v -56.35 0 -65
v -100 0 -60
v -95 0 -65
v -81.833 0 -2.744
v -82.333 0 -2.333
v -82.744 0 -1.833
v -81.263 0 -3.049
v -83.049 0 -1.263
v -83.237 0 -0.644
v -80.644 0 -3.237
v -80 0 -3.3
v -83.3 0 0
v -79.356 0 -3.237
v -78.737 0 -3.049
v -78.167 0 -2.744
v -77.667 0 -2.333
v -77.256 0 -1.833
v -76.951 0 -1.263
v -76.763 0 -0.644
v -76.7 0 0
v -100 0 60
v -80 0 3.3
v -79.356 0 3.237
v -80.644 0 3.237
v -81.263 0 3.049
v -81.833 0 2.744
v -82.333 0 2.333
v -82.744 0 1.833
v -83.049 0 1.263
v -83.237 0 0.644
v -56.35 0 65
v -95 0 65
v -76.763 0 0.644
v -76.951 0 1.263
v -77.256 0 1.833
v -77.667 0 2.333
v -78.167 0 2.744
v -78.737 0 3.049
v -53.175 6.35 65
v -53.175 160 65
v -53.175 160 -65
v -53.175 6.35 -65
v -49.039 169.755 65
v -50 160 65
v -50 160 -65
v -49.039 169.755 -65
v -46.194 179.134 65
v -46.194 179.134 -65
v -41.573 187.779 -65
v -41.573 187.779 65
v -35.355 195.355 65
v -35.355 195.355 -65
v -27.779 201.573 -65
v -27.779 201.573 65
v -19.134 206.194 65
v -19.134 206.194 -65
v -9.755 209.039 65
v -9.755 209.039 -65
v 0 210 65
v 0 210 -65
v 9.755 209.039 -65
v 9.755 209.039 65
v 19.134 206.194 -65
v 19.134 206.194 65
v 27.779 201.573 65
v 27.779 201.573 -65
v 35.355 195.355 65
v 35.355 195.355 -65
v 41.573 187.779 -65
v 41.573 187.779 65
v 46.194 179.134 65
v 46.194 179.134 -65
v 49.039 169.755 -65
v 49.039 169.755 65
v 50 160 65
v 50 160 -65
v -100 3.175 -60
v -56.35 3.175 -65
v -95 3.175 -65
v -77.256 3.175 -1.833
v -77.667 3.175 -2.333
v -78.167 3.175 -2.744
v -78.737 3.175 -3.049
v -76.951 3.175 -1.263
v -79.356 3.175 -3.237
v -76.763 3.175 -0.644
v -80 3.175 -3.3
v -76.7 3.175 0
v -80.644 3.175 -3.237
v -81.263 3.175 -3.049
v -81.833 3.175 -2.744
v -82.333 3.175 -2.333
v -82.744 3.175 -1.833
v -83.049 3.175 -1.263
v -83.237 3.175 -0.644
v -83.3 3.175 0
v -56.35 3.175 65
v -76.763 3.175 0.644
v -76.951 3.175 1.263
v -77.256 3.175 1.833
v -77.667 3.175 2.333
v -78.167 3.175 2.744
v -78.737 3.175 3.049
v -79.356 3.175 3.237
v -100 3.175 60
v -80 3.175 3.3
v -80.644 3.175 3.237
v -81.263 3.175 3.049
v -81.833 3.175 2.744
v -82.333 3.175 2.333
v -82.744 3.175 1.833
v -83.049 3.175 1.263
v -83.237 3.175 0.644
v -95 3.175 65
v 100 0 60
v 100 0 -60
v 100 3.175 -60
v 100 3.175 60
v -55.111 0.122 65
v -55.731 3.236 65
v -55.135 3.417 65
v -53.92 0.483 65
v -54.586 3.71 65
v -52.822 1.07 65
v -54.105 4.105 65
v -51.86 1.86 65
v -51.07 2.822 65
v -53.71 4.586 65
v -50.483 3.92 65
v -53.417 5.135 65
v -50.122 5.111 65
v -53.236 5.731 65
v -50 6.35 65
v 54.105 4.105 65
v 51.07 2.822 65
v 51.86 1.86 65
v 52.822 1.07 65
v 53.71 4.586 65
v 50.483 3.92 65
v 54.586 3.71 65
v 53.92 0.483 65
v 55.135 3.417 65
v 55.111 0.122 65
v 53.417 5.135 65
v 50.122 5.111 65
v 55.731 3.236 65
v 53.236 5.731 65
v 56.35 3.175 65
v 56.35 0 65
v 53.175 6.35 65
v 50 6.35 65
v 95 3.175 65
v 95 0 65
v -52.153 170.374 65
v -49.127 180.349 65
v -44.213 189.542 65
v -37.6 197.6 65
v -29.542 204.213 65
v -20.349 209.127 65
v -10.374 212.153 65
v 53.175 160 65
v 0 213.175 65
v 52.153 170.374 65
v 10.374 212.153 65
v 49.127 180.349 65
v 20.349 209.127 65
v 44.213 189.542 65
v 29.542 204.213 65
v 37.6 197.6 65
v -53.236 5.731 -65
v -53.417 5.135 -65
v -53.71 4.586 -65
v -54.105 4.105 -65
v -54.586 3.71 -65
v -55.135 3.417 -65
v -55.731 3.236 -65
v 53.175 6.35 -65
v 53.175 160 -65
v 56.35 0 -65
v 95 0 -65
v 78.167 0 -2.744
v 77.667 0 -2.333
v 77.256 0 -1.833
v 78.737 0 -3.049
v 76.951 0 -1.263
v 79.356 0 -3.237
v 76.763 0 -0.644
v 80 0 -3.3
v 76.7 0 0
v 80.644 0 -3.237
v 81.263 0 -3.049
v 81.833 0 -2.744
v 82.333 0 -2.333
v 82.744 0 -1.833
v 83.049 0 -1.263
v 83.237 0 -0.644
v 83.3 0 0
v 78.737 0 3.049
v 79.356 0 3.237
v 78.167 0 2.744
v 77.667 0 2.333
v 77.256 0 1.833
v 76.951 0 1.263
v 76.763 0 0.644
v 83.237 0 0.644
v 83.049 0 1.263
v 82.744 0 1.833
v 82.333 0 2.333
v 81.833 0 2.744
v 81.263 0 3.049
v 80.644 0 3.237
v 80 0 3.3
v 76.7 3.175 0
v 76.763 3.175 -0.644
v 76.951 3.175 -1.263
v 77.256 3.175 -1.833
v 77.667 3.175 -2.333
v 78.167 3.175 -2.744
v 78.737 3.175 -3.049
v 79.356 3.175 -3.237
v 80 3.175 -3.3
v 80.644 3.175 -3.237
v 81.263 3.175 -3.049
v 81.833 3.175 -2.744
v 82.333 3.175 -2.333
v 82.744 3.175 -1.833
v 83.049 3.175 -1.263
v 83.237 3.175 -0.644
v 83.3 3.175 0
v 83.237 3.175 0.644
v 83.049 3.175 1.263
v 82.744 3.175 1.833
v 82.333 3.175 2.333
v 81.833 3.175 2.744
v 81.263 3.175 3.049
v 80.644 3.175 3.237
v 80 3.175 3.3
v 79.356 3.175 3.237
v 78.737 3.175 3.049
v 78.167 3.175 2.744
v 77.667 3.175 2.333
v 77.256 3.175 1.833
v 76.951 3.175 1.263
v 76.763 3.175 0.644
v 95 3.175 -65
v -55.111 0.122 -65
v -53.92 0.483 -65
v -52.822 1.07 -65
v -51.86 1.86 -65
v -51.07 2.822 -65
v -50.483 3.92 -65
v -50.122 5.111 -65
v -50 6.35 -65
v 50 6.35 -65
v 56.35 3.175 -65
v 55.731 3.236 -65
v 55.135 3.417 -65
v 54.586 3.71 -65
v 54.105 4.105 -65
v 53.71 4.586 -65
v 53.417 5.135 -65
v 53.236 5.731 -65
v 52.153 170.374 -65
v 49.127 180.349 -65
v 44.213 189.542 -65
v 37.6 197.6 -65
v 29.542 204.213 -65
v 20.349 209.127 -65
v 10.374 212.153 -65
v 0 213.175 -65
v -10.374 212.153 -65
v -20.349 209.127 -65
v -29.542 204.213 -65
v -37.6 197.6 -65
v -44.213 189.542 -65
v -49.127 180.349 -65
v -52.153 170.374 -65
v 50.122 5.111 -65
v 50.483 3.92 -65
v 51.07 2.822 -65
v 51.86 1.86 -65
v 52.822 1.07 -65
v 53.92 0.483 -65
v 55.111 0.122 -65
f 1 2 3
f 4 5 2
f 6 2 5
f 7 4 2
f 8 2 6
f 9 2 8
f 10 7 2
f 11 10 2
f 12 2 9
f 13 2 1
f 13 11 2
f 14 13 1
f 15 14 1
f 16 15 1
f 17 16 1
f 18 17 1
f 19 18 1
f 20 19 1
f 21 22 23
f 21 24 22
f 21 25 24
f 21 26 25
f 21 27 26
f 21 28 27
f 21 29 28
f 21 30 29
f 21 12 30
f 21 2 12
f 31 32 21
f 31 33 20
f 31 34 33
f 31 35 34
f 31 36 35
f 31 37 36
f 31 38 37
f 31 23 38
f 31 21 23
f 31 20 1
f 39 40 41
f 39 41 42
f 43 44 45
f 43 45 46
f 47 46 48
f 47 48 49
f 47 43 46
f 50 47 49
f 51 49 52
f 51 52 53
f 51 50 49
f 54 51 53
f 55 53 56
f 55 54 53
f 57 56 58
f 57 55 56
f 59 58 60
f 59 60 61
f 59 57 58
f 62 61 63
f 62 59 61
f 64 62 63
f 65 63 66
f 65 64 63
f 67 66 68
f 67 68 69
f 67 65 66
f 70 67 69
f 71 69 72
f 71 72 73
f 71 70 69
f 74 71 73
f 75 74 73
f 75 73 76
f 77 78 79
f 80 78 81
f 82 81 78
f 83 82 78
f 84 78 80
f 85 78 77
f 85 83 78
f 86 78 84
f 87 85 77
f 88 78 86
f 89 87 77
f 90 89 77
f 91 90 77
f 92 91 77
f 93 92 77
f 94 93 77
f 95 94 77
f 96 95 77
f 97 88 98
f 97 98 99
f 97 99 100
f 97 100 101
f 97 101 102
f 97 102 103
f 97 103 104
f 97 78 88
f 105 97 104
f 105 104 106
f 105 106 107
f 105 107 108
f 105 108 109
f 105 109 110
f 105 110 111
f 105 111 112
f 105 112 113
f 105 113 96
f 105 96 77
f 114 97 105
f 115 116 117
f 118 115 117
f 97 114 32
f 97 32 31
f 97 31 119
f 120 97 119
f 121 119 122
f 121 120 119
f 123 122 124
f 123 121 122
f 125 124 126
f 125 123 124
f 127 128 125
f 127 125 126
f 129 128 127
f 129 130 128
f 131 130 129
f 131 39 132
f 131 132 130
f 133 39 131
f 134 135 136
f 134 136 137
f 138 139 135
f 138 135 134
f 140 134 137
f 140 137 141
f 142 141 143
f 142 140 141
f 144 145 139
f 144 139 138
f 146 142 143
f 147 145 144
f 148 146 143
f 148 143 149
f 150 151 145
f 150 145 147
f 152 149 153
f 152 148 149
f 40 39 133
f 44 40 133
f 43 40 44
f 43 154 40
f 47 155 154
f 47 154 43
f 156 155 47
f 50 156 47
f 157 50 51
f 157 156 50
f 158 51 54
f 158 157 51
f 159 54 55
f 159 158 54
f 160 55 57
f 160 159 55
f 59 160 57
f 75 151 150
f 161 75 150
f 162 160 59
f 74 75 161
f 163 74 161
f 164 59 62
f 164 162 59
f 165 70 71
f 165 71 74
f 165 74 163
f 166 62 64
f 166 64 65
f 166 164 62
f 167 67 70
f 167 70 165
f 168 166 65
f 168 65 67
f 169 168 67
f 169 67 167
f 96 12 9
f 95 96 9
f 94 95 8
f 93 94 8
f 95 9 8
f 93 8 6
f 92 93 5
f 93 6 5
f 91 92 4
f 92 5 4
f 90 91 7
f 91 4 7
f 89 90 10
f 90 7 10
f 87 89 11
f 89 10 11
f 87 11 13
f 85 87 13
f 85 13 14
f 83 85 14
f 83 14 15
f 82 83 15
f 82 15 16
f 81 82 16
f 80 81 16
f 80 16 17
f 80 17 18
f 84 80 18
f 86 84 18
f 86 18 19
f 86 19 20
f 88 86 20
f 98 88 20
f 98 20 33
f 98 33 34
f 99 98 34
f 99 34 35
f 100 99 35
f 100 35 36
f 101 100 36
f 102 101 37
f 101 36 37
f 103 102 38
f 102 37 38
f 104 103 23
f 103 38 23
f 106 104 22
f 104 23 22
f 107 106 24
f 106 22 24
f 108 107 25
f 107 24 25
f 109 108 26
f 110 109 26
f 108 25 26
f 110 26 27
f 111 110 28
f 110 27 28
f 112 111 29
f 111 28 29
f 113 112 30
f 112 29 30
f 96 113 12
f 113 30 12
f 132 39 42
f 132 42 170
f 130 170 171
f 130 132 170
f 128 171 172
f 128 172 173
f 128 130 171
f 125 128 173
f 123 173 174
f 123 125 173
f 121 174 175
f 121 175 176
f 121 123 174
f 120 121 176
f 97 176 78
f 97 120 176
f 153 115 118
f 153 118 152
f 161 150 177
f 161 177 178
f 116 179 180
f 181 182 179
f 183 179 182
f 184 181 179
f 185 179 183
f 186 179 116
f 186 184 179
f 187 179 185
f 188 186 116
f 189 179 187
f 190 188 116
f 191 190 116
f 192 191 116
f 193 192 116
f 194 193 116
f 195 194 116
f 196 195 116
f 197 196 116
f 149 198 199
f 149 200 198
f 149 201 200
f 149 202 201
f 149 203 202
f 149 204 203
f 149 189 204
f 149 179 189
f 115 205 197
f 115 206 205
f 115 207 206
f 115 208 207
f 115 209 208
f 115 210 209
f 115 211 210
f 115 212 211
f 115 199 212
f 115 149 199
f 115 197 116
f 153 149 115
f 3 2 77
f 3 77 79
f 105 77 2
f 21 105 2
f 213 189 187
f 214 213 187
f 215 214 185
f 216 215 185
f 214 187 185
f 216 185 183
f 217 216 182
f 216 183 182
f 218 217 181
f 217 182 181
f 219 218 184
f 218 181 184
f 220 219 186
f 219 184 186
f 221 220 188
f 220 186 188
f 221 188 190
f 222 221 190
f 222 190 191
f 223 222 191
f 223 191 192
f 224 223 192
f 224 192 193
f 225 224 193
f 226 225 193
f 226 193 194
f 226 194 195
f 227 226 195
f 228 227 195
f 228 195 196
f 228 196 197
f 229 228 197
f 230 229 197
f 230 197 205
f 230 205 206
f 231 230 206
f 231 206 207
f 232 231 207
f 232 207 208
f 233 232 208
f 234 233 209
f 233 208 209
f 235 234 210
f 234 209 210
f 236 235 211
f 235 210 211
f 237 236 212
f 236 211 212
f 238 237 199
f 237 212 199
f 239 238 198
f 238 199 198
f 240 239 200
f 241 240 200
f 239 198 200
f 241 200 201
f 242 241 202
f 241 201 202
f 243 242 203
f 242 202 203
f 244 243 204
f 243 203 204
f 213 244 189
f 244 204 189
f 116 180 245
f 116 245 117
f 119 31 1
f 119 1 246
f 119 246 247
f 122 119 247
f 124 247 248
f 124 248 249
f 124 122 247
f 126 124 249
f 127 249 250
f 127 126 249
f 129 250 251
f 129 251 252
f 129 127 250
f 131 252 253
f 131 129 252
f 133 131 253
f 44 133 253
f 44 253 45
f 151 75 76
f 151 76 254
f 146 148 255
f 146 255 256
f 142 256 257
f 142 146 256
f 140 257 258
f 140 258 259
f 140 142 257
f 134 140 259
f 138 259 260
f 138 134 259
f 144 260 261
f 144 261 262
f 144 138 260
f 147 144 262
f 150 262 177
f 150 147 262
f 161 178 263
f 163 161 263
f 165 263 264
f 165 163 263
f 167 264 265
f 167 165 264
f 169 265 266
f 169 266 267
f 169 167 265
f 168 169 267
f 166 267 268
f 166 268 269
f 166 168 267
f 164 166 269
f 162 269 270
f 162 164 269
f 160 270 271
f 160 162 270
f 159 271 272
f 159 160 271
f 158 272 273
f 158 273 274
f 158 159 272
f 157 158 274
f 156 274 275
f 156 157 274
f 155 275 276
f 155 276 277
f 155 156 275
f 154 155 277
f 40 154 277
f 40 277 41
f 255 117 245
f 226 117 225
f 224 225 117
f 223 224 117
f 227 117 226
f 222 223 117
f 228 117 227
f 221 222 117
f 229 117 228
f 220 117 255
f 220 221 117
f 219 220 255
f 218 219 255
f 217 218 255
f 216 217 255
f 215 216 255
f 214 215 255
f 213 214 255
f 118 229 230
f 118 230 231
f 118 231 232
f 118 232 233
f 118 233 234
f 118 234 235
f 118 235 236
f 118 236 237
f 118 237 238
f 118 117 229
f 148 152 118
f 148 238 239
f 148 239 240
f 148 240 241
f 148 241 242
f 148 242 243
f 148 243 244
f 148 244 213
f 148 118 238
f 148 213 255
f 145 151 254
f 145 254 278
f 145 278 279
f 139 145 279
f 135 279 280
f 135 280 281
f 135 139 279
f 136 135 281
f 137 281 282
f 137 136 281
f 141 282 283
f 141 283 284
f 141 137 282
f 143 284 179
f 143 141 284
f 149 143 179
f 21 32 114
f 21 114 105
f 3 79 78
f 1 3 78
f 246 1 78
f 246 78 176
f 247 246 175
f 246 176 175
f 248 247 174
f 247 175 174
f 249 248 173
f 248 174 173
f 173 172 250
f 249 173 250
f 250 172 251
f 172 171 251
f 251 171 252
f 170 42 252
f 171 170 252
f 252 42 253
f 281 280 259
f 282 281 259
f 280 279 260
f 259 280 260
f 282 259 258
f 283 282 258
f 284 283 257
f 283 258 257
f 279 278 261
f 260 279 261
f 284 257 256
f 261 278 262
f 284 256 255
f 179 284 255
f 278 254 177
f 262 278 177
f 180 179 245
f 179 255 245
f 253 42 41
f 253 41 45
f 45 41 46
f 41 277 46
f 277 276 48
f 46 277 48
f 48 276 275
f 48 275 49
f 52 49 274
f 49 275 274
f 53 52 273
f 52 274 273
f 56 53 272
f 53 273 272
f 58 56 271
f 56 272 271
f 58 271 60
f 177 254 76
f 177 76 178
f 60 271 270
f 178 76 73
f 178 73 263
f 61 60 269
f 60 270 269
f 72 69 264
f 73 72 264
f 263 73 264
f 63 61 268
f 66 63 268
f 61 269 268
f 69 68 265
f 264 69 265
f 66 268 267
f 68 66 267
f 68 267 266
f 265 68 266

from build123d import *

# Parameters (mm, degrees)
BASE_FLANGE1_DEPTH         = 65
F_6_6_6_6_DIAMETER_HOLE1_D = 6.6
BREAK_CORNER1_DEPTH        = 3.175


# Read off the part's stored shape, not the designer's step: Break-Corner1
# Sheet-metal steps are written as plain solids
with BuildPart() as part:
    # Sketch1 → Base-Flange1 (new, symmetric)
    with BuildSketch(Plane.XY):
        with BuildLine():
            Line((-100, 0), (-56.35, 0))
            ThreePointArc((-56.35, 0), (-51.859871939, 1.859871939), (-50, 6.35))
            Line((-50, 6.35), (-50, 160))
            ThreePointArc((-50, 160), (0, 210), (50, 160))
            Line((50, 160), (50, 6.35))
            ThreePointArc((50, 6.35), (51.859871939, 1.859871939), (56.35, 0))
            Line((56.35, 0), (100, 0))
            Line((100, 0), (100, 3.175))
            Line((100, 3.175), (56.35, 3.175))
            ThreePointArc((56.35, 3.175), (54.10493597, 4.10493597), (53.175, 6.35))
            Line((53.175, 6.35), (53.175, 160))
            ThreePointArc((53.175, 160), (0, 213.175), (-53.175, 160))
            Line((-53.175, 160), (-53.175, 6.35))
            ThreePointArc((-53.175, 6.35), (-54.10493597, 4.10493597), (-56.35, 3.175))
            Line((-56.35, 3.175), (-100, 3.175))
            Line((-100, 3.175), (-100, 0))
        make_face()
    extrude(amount=BASE_FLANGE1_DEPTH, both=True)

    # Ø6.6 (6.6) Diameter Hole1 (through all)
    with Locations(Plane(origin=(0, 3.175, 0), x_dir=(1, 0, 0), z_dir=(0, 1, 0))):
        with Locations((-80, 0), (80, 0)):
            Hole(F_6_6_6_6_DIAMETER_HOLE1_D / 2)

    # Break-Corner1 outline → Break-Corner1 (cut)
    with BuildSketch(Plane(origin=(0, 0, 0), x_dir=(1, 0, 0), z_dir=(0, 1, 0))):
        Polygon((-100, -65), (-95, -65), (-100, -60), align=None)
        Polygon((-100, 65), (-100, 60), (-95, 65), align=None)
        Polygon((100, -65), (100, -60), (95, -65), align=None)
        Polygon((95, 65), (100, 60), (100, 65), align=None)
    extrude(amount=BREAK_CORNER1_DEPTH, mode=Mode.SUBTRACT)


solid = part.part
